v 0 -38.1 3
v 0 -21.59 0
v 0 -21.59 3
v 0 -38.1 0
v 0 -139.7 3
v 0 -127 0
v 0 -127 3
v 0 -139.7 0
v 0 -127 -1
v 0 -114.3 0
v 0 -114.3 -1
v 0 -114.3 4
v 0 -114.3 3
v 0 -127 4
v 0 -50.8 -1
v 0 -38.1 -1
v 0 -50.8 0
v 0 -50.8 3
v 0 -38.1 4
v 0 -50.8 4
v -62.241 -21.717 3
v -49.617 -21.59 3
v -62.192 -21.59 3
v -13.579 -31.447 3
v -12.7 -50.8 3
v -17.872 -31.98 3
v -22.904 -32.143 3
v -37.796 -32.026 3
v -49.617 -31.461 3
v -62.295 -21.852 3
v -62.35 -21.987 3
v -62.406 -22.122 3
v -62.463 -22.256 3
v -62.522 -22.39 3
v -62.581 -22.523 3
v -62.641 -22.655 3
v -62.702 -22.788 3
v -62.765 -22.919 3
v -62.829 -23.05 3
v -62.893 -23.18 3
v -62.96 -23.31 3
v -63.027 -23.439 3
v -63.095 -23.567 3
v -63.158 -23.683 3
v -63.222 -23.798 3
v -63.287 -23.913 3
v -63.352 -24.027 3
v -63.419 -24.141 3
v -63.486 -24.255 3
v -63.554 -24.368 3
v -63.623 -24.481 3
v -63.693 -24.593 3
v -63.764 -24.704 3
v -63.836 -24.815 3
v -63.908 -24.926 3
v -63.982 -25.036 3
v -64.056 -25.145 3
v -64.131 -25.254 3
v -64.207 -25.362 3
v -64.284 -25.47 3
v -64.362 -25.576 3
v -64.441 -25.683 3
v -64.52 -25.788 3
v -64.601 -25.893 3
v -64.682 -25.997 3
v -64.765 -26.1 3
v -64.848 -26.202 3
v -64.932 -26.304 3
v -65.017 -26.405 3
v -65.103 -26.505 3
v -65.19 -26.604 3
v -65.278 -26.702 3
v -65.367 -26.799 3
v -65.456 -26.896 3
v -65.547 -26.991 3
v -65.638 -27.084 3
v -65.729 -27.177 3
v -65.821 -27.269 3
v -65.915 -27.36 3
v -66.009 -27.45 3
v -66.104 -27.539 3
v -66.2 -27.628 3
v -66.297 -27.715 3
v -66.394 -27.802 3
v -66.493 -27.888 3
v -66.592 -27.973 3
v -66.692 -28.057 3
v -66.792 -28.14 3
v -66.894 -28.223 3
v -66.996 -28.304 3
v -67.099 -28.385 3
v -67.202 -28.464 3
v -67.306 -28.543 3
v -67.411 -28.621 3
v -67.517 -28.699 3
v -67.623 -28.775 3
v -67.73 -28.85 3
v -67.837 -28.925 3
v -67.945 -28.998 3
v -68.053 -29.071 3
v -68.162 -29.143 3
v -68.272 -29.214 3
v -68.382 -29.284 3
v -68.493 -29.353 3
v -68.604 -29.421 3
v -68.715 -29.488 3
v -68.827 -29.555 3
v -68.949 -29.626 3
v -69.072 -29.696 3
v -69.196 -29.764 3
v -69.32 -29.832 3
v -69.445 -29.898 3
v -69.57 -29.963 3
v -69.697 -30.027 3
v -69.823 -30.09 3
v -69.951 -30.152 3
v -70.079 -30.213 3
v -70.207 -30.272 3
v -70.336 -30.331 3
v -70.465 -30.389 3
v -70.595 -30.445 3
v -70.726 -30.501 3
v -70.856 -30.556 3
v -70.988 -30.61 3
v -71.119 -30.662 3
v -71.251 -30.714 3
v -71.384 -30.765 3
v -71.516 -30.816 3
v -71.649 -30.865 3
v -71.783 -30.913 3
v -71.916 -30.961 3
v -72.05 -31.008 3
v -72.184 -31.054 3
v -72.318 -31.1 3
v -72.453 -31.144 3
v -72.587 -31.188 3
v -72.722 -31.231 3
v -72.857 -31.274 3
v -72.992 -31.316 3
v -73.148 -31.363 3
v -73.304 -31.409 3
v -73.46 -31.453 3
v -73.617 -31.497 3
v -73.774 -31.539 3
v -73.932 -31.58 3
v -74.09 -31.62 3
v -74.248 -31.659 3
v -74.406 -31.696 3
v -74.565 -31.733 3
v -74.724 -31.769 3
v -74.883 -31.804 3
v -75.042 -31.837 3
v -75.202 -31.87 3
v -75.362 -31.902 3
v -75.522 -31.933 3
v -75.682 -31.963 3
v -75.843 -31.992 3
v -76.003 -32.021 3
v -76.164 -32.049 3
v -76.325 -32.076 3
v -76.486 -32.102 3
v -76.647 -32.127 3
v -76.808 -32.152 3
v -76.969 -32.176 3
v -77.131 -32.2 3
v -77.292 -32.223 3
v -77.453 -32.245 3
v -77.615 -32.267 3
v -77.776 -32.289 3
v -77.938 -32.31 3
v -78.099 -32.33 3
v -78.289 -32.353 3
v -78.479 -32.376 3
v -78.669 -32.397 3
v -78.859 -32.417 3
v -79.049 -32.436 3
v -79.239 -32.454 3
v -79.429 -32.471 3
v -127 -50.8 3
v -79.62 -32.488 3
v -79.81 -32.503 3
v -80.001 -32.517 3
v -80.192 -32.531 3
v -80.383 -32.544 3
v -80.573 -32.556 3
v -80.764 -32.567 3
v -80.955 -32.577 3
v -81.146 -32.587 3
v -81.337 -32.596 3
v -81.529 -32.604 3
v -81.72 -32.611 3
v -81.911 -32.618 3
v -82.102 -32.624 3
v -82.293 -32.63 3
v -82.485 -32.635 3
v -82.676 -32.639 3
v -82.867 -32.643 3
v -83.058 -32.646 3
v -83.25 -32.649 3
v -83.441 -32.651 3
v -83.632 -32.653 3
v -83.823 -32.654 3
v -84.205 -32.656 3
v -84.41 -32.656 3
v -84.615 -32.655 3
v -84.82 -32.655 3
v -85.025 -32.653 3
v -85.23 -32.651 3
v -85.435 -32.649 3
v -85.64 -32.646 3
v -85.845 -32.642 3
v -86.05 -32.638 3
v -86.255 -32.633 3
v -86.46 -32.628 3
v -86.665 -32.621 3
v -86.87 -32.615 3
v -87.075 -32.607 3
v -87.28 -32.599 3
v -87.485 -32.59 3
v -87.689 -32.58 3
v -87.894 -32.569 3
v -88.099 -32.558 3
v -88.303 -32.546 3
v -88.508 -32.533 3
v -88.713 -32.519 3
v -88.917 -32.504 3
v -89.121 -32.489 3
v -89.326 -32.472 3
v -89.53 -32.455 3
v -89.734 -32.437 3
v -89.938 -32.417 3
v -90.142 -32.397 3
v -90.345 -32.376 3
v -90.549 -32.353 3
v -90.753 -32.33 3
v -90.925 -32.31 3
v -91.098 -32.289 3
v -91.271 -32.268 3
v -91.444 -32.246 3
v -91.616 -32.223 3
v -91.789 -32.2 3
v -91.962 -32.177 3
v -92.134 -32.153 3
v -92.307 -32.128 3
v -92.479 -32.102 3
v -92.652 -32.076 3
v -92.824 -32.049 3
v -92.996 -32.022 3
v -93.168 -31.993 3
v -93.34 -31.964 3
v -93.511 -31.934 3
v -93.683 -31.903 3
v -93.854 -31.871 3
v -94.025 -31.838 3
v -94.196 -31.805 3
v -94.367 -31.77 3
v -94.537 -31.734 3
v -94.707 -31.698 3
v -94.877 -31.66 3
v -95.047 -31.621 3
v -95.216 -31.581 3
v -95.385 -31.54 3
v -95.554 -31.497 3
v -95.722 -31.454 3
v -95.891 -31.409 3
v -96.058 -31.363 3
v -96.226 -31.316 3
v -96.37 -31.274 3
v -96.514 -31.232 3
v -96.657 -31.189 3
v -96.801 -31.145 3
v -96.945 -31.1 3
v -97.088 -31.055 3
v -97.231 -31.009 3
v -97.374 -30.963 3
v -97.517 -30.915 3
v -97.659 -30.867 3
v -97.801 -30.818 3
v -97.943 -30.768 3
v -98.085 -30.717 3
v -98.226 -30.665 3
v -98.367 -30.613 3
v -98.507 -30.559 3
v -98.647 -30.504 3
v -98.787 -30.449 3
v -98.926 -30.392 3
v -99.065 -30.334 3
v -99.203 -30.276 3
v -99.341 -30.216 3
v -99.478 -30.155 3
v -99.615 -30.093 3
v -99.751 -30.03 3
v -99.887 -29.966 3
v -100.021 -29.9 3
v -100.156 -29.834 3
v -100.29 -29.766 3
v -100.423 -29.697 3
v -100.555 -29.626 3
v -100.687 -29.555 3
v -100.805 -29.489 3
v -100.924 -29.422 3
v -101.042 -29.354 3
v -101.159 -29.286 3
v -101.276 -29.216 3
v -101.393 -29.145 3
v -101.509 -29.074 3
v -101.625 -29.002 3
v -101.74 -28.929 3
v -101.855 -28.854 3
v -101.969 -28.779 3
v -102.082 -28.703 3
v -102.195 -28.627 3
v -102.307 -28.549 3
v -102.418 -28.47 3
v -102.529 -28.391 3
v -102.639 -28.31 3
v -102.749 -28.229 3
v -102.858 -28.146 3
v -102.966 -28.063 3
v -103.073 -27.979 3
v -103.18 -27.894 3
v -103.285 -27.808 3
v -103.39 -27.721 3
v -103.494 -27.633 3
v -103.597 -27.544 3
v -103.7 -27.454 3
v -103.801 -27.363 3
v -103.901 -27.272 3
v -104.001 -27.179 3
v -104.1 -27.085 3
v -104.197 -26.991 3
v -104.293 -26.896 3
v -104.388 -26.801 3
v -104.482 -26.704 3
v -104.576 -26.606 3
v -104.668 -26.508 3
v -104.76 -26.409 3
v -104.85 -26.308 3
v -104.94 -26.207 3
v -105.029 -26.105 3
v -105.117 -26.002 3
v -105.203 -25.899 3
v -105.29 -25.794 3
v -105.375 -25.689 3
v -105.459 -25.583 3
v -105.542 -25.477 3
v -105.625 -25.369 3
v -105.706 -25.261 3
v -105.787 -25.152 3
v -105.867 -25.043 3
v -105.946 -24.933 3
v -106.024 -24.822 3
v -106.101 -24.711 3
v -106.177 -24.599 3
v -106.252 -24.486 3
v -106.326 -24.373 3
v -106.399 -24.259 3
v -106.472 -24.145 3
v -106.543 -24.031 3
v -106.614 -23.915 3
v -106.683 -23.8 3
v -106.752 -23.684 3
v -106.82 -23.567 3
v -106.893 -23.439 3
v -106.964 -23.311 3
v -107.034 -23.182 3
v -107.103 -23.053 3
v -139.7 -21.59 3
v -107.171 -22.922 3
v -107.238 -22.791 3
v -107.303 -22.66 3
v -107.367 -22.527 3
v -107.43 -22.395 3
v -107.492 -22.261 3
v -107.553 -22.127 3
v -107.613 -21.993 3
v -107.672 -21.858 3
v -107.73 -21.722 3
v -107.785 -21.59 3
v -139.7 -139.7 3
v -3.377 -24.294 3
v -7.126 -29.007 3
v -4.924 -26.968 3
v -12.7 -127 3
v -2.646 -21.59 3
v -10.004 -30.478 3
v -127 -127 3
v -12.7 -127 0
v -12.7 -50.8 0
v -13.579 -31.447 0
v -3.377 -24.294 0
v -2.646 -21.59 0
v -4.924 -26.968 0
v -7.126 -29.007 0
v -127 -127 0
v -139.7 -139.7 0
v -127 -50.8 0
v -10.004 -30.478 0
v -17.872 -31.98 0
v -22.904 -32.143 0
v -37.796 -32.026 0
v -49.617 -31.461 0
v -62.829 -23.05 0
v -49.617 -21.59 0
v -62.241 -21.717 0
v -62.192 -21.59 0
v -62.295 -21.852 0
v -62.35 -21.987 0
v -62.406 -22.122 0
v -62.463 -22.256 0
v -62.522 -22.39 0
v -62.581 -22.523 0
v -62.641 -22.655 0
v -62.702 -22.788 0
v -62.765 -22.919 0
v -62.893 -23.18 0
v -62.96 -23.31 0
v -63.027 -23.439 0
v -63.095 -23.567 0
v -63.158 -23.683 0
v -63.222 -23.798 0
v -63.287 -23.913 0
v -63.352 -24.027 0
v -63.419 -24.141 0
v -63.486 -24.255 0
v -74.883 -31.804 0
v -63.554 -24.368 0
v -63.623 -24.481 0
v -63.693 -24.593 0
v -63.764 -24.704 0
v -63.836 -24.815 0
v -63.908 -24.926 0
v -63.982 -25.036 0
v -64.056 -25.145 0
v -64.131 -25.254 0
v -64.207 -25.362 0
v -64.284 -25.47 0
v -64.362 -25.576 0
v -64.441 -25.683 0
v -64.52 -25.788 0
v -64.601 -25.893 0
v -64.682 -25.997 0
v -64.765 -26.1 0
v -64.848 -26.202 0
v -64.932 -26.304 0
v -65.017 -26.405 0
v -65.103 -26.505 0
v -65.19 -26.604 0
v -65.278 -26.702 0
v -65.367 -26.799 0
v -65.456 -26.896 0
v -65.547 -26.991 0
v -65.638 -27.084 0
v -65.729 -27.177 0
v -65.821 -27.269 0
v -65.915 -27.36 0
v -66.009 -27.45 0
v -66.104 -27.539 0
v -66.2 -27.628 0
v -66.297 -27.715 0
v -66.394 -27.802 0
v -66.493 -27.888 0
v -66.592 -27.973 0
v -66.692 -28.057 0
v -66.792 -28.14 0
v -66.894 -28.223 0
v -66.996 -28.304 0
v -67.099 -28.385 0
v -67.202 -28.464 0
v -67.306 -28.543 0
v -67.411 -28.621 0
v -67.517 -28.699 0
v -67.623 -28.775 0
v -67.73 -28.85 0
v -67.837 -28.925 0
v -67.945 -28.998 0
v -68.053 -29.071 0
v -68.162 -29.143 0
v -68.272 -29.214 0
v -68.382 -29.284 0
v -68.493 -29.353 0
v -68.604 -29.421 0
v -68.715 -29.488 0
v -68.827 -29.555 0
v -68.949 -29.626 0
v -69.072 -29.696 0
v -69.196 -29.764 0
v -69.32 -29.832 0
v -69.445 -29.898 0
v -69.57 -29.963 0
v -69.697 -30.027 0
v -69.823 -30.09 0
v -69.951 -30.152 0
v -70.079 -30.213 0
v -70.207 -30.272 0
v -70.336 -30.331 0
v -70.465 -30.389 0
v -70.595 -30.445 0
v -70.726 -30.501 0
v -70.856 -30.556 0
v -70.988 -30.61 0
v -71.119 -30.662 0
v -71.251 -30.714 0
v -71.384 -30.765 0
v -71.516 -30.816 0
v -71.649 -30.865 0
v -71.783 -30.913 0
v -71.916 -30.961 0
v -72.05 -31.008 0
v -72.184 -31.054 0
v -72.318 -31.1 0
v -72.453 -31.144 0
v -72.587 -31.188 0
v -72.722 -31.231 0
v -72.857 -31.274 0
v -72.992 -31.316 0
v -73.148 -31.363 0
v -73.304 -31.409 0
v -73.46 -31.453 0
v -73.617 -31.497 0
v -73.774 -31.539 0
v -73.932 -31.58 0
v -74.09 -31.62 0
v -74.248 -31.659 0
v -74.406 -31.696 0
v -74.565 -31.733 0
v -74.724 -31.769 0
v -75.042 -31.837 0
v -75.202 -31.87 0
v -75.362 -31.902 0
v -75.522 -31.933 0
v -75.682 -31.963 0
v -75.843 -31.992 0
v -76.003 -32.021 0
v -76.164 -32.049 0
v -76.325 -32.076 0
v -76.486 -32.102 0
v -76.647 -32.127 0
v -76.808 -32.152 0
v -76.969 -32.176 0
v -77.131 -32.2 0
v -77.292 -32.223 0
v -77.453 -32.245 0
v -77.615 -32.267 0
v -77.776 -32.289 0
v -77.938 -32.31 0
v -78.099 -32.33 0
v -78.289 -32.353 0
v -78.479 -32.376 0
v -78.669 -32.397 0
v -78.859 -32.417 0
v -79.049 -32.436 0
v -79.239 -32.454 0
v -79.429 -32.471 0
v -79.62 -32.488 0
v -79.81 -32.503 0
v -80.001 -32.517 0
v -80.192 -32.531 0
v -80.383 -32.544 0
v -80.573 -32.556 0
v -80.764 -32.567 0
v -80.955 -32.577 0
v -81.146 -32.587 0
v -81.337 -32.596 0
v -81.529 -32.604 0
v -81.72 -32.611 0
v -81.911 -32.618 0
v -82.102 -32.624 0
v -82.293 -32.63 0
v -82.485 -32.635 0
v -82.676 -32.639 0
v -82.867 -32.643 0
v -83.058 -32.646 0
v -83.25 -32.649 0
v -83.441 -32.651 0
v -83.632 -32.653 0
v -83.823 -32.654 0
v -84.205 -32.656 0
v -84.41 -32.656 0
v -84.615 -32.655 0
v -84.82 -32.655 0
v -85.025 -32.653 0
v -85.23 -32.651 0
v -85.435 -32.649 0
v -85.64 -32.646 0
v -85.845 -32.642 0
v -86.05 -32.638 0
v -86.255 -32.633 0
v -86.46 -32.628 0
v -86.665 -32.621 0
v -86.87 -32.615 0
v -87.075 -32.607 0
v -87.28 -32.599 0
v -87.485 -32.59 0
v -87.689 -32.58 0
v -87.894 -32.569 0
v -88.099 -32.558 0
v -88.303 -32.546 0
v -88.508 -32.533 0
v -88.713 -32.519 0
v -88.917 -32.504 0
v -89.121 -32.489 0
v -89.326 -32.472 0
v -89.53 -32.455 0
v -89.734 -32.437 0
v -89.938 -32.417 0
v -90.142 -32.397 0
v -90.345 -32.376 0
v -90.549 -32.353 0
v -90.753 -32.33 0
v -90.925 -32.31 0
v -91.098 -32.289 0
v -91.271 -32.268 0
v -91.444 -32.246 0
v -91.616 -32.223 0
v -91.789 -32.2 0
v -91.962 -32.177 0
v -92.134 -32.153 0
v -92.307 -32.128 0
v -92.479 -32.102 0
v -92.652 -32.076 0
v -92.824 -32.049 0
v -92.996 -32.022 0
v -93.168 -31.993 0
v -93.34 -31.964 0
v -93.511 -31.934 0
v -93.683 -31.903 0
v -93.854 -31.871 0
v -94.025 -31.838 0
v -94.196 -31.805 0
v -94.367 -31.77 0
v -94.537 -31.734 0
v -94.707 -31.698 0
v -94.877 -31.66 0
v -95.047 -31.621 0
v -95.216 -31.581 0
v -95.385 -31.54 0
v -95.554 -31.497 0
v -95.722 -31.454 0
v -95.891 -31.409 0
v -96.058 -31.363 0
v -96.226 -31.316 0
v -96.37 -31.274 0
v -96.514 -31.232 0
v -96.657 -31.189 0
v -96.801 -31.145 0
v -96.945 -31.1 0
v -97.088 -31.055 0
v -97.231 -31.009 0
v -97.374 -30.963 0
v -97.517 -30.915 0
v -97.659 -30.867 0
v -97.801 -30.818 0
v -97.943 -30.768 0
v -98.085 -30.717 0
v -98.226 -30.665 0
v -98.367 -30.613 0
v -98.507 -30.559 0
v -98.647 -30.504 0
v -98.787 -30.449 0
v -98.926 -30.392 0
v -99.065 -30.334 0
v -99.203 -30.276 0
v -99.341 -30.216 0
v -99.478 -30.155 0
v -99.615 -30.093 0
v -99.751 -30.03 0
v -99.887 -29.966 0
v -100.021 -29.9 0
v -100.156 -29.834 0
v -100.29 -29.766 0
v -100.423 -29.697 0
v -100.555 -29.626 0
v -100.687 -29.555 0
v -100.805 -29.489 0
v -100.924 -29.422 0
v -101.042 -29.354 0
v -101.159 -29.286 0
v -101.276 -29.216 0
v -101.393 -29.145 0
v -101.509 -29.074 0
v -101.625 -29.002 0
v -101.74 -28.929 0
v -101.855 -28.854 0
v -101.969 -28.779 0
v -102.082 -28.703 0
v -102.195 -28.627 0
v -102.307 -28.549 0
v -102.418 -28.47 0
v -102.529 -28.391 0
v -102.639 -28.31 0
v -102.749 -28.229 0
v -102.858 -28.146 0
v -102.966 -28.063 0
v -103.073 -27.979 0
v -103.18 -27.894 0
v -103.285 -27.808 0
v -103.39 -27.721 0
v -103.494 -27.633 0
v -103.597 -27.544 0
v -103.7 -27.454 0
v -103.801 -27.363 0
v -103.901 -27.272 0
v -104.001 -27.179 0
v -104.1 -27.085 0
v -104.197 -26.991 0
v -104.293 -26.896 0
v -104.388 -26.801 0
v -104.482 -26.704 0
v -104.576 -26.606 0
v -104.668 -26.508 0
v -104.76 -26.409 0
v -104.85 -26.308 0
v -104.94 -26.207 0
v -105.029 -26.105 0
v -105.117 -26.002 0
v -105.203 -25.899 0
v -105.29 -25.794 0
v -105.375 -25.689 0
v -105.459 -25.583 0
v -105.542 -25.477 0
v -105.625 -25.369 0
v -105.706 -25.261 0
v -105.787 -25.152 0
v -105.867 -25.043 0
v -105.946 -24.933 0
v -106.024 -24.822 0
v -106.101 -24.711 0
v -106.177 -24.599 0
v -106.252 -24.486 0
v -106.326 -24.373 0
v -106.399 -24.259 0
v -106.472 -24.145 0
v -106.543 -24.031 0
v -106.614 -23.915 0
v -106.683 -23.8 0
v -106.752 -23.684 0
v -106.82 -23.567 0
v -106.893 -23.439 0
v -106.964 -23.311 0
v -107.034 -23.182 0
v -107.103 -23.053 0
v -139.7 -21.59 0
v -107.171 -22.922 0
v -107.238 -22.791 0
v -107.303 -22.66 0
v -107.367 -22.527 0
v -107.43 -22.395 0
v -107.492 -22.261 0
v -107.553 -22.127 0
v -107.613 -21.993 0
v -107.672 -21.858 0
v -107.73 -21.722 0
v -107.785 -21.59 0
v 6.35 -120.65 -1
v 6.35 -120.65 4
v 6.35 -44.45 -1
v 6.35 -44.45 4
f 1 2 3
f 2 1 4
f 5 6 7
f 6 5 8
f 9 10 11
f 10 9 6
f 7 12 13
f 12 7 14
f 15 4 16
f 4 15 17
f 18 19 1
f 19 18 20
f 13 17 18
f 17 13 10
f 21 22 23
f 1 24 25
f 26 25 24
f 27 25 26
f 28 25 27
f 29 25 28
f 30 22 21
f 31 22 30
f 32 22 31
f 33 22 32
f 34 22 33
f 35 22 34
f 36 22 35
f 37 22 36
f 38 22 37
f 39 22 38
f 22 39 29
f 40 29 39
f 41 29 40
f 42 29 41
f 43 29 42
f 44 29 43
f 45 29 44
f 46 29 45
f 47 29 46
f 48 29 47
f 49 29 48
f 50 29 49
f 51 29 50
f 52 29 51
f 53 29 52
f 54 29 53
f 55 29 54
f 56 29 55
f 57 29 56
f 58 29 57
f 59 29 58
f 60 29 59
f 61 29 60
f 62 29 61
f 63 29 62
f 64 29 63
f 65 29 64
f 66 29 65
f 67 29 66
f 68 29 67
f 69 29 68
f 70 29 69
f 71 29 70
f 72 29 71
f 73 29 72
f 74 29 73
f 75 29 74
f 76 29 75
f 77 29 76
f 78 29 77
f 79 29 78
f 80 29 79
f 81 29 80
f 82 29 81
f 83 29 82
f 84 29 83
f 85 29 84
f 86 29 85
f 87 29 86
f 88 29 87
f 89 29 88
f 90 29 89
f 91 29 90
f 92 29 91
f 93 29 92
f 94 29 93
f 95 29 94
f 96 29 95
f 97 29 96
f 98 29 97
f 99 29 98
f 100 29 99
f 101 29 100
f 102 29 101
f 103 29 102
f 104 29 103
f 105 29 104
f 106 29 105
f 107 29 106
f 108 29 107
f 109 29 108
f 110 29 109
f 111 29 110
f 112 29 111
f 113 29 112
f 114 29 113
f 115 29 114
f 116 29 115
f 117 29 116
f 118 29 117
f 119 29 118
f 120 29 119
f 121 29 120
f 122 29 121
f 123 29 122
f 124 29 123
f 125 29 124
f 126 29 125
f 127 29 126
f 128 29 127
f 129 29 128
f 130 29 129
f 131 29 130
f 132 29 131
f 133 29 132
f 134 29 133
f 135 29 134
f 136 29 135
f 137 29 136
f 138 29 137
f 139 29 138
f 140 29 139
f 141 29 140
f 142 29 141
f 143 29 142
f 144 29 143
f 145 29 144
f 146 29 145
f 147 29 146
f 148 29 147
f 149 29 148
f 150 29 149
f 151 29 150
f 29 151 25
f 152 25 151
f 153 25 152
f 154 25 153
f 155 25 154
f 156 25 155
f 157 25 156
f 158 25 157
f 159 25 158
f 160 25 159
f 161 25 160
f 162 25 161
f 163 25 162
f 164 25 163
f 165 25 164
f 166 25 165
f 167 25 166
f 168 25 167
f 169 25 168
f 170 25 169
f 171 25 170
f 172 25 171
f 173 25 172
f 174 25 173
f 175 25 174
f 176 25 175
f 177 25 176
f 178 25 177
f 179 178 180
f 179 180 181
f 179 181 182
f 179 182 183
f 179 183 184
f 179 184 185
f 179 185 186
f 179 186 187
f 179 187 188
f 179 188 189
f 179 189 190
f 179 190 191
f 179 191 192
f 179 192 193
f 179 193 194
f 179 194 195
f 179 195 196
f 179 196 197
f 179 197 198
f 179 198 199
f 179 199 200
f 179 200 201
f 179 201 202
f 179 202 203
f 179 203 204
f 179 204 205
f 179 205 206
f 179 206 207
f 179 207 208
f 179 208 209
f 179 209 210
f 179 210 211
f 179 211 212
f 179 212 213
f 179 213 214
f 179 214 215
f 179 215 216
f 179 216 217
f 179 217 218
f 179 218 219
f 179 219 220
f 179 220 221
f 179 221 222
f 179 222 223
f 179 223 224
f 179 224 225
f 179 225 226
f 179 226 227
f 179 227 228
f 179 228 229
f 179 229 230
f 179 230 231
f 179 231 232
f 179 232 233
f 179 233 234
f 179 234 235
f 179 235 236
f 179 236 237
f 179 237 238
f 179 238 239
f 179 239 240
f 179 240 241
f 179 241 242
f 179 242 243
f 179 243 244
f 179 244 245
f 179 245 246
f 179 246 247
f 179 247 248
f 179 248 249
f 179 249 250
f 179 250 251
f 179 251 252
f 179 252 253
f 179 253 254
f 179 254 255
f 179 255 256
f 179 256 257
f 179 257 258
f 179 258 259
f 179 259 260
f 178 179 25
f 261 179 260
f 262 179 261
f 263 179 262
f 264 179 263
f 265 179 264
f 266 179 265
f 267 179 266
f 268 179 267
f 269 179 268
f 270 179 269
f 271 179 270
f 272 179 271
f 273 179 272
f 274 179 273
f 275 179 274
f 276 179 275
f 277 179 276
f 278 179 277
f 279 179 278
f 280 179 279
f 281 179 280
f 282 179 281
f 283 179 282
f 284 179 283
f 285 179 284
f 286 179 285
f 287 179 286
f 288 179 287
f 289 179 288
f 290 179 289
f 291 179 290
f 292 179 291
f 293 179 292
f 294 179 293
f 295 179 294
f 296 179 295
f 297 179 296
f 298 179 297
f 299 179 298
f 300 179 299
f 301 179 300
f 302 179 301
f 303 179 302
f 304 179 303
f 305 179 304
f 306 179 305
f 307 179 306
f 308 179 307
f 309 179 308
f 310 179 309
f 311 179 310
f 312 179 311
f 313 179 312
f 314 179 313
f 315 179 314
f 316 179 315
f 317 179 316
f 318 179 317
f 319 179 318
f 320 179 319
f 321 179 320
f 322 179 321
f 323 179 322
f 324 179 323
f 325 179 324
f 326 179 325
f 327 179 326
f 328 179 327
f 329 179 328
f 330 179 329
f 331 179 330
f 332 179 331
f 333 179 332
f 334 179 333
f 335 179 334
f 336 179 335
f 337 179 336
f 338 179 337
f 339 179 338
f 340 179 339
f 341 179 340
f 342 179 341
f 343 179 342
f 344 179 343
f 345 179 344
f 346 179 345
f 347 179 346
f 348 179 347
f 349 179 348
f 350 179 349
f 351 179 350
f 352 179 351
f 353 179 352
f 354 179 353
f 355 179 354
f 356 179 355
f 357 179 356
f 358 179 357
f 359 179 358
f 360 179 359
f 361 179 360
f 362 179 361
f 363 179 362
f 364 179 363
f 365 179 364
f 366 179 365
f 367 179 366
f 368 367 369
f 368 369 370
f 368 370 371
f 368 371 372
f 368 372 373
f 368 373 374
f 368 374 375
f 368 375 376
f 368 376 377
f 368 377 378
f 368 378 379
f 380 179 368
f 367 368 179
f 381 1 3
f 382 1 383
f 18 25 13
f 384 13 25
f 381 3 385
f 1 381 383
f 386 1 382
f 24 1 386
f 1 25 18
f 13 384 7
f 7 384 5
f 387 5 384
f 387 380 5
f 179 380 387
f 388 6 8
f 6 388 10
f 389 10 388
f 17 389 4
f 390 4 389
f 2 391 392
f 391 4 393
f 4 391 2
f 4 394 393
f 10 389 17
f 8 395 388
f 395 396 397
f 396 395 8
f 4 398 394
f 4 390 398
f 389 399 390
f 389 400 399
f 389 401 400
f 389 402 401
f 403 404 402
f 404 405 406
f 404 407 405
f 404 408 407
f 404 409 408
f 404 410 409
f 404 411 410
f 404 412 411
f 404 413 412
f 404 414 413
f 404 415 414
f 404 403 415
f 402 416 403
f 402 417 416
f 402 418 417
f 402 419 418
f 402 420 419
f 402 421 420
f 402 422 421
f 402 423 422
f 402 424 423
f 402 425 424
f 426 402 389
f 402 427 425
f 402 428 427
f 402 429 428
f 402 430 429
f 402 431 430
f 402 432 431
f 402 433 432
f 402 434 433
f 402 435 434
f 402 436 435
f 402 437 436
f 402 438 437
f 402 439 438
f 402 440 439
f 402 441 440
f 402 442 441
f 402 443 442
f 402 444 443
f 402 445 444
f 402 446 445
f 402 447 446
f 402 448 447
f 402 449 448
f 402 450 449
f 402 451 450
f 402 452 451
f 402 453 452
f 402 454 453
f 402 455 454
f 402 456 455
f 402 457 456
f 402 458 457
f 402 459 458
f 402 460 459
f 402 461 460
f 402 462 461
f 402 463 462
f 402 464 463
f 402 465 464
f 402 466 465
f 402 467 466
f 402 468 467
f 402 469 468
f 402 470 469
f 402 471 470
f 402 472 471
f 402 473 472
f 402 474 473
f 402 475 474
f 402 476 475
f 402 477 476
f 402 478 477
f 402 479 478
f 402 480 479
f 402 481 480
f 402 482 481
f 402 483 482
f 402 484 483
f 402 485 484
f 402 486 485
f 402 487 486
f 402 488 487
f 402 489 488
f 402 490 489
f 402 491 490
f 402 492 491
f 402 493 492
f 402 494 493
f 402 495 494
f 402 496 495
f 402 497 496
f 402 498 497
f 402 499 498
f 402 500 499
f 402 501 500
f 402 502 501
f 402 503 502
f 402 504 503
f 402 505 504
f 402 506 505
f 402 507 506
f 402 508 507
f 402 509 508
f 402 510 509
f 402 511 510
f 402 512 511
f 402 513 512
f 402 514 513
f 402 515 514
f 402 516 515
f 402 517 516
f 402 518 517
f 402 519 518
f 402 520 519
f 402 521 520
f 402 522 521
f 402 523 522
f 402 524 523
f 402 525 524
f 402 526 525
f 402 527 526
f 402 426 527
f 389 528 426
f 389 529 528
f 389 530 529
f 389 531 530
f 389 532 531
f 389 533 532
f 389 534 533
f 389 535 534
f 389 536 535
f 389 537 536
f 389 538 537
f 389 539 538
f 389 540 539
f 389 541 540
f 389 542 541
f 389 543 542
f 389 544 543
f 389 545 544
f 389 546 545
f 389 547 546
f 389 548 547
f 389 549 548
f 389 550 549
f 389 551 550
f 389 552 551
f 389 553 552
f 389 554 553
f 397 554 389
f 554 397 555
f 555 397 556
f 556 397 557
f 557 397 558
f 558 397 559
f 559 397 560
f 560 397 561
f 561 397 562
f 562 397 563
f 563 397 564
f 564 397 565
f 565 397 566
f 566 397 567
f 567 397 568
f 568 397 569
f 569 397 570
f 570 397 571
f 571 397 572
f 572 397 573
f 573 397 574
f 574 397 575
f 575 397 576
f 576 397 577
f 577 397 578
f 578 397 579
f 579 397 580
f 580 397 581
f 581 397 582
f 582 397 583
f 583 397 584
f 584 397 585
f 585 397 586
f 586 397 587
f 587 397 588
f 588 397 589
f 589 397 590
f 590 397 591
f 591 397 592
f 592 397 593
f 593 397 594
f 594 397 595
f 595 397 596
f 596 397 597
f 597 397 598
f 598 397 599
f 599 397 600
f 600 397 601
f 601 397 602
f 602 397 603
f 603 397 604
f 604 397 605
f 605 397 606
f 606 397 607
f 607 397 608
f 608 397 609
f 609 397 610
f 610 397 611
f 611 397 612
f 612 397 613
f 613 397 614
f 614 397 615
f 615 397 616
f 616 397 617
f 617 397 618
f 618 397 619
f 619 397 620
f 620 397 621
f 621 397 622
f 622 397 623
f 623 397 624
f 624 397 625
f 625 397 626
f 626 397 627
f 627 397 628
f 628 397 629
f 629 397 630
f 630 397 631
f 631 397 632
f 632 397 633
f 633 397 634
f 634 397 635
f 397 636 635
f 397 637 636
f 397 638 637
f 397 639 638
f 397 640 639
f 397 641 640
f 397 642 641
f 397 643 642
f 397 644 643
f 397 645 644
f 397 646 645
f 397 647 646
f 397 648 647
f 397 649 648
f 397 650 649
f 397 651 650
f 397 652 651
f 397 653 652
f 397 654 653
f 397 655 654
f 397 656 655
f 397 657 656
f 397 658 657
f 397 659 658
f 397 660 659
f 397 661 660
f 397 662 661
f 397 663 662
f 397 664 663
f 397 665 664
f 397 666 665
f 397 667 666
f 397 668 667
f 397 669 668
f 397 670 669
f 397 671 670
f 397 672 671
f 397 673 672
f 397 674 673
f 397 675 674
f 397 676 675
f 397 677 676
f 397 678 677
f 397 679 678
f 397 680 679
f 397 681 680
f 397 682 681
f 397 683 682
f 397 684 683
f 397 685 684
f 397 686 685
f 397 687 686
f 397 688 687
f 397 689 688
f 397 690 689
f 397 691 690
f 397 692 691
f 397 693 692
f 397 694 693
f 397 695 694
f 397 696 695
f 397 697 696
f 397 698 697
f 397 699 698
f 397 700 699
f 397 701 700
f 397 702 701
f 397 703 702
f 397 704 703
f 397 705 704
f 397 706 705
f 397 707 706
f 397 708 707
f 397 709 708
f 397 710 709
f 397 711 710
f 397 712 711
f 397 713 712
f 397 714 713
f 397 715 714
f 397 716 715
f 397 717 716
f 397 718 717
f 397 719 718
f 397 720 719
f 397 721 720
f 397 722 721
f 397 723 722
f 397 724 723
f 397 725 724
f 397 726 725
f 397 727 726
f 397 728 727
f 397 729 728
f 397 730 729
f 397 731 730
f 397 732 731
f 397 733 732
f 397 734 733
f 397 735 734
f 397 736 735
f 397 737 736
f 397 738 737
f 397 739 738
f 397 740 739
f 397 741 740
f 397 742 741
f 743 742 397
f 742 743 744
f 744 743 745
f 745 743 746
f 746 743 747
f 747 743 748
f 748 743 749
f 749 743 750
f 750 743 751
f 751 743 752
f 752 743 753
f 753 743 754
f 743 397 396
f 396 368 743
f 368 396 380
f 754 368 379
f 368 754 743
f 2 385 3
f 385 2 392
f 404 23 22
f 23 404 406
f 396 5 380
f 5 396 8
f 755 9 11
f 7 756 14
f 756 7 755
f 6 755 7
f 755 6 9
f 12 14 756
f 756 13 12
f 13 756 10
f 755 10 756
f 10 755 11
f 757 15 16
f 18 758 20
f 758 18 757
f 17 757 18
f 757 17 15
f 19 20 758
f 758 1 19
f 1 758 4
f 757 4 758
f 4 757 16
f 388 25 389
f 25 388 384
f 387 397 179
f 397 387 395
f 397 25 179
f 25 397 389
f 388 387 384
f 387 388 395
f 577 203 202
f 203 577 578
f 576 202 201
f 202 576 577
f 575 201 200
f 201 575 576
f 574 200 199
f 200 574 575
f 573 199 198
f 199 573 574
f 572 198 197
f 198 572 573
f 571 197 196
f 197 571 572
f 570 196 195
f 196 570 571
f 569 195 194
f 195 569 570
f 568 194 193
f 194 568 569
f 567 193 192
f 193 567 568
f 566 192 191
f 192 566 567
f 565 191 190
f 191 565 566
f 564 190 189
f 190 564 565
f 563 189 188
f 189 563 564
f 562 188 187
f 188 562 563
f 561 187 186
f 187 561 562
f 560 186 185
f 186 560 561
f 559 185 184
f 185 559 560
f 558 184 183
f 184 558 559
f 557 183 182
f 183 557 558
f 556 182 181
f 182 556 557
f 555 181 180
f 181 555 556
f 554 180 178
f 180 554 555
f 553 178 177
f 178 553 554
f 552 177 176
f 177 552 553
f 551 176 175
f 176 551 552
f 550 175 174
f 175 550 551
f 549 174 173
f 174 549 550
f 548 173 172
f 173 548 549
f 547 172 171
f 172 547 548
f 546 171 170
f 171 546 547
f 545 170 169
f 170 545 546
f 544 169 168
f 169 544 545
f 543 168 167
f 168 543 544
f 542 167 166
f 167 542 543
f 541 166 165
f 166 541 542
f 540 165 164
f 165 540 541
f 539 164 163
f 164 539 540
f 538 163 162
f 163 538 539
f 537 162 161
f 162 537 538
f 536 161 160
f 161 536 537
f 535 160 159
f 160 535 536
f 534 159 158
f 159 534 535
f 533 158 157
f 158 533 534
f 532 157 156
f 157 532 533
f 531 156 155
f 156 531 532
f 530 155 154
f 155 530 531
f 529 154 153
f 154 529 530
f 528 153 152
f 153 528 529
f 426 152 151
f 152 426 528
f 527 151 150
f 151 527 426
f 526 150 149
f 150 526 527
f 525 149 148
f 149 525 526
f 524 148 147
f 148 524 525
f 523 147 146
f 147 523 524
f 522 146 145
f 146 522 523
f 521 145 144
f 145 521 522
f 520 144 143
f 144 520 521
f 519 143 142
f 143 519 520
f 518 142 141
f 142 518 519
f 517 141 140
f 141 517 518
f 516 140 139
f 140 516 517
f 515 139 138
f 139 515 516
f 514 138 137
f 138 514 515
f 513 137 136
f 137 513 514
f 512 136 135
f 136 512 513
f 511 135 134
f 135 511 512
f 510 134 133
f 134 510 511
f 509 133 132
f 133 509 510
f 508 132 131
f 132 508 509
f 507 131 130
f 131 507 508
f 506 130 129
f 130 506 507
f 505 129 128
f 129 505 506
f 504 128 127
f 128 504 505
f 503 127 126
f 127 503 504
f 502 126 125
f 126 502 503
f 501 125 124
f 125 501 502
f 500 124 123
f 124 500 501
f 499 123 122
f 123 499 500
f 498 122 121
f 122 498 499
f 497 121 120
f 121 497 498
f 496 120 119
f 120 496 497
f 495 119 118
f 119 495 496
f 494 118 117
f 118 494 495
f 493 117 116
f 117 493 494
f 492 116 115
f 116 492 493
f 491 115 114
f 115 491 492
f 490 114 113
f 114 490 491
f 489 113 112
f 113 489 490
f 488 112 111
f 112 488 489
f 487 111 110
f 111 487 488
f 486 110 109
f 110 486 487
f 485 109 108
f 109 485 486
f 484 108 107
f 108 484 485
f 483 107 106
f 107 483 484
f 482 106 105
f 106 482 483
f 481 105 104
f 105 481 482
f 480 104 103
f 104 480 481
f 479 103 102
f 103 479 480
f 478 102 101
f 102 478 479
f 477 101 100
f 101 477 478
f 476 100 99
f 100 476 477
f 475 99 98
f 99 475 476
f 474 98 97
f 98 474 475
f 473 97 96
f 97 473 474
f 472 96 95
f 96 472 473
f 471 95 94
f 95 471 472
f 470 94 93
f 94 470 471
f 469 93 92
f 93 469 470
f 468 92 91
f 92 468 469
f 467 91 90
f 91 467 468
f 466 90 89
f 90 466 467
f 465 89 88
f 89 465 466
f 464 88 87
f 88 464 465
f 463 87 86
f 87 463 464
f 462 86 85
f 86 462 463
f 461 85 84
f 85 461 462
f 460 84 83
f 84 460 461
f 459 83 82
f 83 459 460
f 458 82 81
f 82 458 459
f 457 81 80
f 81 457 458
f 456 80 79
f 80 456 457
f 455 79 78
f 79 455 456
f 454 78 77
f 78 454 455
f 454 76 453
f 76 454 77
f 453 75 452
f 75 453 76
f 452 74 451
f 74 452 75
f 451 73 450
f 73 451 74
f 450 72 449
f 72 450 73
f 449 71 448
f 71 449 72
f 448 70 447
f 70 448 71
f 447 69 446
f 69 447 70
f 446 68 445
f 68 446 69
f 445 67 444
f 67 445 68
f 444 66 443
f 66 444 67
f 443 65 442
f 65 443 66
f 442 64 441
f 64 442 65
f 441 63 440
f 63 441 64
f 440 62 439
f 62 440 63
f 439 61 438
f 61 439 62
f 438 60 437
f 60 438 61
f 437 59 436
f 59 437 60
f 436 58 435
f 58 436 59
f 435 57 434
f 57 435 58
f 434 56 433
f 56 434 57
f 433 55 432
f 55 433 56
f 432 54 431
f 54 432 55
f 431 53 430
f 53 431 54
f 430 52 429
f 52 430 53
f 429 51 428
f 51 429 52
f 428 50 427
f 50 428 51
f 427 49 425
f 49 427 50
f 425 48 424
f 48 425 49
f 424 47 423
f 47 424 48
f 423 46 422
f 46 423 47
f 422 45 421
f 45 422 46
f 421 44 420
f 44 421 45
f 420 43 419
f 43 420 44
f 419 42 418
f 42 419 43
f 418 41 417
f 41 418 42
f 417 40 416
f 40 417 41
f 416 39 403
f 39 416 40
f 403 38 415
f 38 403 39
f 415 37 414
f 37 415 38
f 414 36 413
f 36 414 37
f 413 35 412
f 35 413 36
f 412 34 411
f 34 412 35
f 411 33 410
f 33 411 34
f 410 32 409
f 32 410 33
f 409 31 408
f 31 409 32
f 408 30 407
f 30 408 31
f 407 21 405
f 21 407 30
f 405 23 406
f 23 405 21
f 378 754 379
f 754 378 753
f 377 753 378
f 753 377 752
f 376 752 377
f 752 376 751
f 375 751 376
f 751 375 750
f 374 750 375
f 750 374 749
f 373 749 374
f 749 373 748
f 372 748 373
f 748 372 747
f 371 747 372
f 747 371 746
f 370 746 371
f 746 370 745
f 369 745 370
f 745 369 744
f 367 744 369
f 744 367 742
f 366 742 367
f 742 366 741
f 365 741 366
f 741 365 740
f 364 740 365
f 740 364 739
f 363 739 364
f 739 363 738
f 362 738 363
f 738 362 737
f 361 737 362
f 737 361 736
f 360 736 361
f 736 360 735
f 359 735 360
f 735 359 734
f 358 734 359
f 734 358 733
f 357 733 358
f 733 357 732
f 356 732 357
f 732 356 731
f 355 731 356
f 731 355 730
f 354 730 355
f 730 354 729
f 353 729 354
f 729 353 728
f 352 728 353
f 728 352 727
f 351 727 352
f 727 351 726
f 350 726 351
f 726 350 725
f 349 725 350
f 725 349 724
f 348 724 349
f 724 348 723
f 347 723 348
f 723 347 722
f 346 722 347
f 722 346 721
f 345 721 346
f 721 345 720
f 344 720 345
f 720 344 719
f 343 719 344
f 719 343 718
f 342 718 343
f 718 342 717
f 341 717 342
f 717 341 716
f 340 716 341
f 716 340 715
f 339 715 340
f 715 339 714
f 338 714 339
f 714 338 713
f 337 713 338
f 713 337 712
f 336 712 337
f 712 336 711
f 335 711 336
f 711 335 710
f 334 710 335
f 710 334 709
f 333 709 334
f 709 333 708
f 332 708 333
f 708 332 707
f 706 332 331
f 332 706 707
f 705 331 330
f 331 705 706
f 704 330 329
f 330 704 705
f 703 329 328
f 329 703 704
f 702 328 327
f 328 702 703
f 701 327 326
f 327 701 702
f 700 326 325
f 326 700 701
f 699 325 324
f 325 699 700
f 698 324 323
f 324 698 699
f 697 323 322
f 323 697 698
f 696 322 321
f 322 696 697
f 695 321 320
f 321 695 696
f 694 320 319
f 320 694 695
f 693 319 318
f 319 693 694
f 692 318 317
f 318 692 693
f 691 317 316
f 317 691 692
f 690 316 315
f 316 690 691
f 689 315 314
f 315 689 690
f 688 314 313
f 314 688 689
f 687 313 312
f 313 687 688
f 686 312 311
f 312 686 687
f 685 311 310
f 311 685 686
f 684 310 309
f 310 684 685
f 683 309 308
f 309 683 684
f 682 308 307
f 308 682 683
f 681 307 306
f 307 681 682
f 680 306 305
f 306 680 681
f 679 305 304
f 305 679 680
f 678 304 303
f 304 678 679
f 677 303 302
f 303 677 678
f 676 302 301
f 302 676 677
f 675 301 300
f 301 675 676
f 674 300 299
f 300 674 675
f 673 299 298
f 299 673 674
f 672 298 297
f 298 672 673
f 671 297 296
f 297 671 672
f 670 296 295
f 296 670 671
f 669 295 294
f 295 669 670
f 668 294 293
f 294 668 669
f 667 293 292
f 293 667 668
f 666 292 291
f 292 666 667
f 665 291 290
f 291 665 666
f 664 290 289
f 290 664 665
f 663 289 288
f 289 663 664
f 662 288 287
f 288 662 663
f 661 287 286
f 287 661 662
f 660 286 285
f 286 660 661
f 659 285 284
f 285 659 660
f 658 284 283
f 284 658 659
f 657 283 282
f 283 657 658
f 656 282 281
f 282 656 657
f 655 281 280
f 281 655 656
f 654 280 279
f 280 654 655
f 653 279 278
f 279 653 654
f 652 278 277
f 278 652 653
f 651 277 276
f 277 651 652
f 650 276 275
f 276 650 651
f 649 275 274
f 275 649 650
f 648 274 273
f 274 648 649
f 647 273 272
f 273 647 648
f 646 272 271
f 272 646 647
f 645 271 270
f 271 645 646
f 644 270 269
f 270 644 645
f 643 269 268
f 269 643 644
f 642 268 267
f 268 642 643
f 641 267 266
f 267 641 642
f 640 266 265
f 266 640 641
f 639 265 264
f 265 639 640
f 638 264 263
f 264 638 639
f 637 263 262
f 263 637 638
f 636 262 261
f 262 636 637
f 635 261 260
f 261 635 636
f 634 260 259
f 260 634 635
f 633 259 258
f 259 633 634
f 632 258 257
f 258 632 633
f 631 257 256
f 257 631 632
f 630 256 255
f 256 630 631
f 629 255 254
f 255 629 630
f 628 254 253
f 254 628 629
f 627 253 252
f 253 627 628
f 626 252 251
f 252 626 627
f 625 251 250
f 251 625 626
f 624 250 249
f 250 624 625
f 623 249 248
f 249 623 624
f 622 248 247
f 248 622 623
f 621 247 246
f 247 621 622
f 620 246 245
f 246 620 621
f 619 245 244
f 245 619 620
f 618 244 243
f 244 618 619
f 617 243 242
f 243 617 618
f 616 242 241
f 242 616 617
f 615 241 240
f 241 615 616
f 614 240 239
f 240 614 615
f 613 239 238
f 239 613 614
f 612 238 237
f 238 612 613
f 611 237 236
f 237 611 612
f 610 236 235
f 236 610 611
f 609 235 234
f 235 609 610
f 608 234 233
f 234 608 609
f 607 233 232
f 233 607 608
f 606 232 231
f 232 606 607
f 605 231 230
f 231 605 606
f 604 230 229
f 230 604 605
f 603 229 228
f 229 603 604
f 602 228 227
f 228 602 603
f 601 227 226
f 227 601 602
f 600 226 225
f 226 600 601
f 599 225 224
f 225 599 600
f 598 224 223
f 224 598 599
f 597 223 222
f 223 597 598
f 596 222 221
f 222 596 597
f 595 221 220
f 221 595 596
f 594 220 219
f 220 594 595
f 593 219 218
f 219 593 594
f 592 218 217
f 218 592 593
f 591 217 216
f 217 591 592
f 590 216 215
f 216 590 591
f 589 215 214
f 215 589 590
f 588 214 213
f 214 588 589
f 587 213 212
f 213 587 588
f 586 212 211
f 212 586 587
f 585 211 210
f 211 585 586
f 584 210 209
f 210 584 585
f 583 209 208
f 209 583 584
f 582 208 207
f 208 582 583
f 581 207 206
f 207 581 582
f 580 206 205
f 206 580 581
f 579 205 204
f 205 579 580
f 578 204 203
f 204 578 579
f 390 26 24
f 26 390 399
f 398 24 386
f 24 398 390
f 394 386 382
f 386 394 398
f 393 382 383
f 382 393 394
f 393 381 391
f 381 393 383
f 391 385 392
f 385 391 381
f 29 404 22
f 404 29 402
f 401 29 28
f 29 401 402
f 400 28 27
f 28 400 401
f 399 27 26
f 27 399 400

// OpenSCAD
//
// Part 1 -- too big for the printer
//

include <ubos-letters-only-module.scad>

$in   = 25.4;
s     = 2.88;

difference() {
    union() {
        translate( [ -5.5 * $in, -5.5 * $in, 0 ] ) {
            cube( [ 5.5 * $in, 4.65 * $in, 3 ] );
        };
        translate( [ 0, -5 * $in, -1 ] )
        linear_extrude( height=5 ) {
            $d = 0.25 * $in;
            polygon( points = [[ 0, 0 ], [ $d, $d ], [ 0, 2*$d ]] );
        };

        translate( [ 0, -2 * $in, -1 ] )
        linear_extrude( height=5 ) {
            $d = 0.25 * $in;
            polygon( points = [[ 0, 0 ], [ $d, $d ], [ 0, 2*$d ]] );
        };
    };
    translate( [ -5 * $in, -5 * $in, -1 ] ) {
        cube( [ 4.5 * $in, 3 * $in, 5 ] );
    }
    translate( [ 0.5 * $in, -5 * $in, -1 ] ) {
        cube( [ 4.5 * $in, 3 * $in, 5 ] );
    }

    translate( [ 0, 0, -1 ] )
    linear_extrude( height=5 )
    rotate( [ 180, 0, 0 ] )
    scale( [ s, s, s ] ) {
        UbosLettersOnlyModule();
    };
};
